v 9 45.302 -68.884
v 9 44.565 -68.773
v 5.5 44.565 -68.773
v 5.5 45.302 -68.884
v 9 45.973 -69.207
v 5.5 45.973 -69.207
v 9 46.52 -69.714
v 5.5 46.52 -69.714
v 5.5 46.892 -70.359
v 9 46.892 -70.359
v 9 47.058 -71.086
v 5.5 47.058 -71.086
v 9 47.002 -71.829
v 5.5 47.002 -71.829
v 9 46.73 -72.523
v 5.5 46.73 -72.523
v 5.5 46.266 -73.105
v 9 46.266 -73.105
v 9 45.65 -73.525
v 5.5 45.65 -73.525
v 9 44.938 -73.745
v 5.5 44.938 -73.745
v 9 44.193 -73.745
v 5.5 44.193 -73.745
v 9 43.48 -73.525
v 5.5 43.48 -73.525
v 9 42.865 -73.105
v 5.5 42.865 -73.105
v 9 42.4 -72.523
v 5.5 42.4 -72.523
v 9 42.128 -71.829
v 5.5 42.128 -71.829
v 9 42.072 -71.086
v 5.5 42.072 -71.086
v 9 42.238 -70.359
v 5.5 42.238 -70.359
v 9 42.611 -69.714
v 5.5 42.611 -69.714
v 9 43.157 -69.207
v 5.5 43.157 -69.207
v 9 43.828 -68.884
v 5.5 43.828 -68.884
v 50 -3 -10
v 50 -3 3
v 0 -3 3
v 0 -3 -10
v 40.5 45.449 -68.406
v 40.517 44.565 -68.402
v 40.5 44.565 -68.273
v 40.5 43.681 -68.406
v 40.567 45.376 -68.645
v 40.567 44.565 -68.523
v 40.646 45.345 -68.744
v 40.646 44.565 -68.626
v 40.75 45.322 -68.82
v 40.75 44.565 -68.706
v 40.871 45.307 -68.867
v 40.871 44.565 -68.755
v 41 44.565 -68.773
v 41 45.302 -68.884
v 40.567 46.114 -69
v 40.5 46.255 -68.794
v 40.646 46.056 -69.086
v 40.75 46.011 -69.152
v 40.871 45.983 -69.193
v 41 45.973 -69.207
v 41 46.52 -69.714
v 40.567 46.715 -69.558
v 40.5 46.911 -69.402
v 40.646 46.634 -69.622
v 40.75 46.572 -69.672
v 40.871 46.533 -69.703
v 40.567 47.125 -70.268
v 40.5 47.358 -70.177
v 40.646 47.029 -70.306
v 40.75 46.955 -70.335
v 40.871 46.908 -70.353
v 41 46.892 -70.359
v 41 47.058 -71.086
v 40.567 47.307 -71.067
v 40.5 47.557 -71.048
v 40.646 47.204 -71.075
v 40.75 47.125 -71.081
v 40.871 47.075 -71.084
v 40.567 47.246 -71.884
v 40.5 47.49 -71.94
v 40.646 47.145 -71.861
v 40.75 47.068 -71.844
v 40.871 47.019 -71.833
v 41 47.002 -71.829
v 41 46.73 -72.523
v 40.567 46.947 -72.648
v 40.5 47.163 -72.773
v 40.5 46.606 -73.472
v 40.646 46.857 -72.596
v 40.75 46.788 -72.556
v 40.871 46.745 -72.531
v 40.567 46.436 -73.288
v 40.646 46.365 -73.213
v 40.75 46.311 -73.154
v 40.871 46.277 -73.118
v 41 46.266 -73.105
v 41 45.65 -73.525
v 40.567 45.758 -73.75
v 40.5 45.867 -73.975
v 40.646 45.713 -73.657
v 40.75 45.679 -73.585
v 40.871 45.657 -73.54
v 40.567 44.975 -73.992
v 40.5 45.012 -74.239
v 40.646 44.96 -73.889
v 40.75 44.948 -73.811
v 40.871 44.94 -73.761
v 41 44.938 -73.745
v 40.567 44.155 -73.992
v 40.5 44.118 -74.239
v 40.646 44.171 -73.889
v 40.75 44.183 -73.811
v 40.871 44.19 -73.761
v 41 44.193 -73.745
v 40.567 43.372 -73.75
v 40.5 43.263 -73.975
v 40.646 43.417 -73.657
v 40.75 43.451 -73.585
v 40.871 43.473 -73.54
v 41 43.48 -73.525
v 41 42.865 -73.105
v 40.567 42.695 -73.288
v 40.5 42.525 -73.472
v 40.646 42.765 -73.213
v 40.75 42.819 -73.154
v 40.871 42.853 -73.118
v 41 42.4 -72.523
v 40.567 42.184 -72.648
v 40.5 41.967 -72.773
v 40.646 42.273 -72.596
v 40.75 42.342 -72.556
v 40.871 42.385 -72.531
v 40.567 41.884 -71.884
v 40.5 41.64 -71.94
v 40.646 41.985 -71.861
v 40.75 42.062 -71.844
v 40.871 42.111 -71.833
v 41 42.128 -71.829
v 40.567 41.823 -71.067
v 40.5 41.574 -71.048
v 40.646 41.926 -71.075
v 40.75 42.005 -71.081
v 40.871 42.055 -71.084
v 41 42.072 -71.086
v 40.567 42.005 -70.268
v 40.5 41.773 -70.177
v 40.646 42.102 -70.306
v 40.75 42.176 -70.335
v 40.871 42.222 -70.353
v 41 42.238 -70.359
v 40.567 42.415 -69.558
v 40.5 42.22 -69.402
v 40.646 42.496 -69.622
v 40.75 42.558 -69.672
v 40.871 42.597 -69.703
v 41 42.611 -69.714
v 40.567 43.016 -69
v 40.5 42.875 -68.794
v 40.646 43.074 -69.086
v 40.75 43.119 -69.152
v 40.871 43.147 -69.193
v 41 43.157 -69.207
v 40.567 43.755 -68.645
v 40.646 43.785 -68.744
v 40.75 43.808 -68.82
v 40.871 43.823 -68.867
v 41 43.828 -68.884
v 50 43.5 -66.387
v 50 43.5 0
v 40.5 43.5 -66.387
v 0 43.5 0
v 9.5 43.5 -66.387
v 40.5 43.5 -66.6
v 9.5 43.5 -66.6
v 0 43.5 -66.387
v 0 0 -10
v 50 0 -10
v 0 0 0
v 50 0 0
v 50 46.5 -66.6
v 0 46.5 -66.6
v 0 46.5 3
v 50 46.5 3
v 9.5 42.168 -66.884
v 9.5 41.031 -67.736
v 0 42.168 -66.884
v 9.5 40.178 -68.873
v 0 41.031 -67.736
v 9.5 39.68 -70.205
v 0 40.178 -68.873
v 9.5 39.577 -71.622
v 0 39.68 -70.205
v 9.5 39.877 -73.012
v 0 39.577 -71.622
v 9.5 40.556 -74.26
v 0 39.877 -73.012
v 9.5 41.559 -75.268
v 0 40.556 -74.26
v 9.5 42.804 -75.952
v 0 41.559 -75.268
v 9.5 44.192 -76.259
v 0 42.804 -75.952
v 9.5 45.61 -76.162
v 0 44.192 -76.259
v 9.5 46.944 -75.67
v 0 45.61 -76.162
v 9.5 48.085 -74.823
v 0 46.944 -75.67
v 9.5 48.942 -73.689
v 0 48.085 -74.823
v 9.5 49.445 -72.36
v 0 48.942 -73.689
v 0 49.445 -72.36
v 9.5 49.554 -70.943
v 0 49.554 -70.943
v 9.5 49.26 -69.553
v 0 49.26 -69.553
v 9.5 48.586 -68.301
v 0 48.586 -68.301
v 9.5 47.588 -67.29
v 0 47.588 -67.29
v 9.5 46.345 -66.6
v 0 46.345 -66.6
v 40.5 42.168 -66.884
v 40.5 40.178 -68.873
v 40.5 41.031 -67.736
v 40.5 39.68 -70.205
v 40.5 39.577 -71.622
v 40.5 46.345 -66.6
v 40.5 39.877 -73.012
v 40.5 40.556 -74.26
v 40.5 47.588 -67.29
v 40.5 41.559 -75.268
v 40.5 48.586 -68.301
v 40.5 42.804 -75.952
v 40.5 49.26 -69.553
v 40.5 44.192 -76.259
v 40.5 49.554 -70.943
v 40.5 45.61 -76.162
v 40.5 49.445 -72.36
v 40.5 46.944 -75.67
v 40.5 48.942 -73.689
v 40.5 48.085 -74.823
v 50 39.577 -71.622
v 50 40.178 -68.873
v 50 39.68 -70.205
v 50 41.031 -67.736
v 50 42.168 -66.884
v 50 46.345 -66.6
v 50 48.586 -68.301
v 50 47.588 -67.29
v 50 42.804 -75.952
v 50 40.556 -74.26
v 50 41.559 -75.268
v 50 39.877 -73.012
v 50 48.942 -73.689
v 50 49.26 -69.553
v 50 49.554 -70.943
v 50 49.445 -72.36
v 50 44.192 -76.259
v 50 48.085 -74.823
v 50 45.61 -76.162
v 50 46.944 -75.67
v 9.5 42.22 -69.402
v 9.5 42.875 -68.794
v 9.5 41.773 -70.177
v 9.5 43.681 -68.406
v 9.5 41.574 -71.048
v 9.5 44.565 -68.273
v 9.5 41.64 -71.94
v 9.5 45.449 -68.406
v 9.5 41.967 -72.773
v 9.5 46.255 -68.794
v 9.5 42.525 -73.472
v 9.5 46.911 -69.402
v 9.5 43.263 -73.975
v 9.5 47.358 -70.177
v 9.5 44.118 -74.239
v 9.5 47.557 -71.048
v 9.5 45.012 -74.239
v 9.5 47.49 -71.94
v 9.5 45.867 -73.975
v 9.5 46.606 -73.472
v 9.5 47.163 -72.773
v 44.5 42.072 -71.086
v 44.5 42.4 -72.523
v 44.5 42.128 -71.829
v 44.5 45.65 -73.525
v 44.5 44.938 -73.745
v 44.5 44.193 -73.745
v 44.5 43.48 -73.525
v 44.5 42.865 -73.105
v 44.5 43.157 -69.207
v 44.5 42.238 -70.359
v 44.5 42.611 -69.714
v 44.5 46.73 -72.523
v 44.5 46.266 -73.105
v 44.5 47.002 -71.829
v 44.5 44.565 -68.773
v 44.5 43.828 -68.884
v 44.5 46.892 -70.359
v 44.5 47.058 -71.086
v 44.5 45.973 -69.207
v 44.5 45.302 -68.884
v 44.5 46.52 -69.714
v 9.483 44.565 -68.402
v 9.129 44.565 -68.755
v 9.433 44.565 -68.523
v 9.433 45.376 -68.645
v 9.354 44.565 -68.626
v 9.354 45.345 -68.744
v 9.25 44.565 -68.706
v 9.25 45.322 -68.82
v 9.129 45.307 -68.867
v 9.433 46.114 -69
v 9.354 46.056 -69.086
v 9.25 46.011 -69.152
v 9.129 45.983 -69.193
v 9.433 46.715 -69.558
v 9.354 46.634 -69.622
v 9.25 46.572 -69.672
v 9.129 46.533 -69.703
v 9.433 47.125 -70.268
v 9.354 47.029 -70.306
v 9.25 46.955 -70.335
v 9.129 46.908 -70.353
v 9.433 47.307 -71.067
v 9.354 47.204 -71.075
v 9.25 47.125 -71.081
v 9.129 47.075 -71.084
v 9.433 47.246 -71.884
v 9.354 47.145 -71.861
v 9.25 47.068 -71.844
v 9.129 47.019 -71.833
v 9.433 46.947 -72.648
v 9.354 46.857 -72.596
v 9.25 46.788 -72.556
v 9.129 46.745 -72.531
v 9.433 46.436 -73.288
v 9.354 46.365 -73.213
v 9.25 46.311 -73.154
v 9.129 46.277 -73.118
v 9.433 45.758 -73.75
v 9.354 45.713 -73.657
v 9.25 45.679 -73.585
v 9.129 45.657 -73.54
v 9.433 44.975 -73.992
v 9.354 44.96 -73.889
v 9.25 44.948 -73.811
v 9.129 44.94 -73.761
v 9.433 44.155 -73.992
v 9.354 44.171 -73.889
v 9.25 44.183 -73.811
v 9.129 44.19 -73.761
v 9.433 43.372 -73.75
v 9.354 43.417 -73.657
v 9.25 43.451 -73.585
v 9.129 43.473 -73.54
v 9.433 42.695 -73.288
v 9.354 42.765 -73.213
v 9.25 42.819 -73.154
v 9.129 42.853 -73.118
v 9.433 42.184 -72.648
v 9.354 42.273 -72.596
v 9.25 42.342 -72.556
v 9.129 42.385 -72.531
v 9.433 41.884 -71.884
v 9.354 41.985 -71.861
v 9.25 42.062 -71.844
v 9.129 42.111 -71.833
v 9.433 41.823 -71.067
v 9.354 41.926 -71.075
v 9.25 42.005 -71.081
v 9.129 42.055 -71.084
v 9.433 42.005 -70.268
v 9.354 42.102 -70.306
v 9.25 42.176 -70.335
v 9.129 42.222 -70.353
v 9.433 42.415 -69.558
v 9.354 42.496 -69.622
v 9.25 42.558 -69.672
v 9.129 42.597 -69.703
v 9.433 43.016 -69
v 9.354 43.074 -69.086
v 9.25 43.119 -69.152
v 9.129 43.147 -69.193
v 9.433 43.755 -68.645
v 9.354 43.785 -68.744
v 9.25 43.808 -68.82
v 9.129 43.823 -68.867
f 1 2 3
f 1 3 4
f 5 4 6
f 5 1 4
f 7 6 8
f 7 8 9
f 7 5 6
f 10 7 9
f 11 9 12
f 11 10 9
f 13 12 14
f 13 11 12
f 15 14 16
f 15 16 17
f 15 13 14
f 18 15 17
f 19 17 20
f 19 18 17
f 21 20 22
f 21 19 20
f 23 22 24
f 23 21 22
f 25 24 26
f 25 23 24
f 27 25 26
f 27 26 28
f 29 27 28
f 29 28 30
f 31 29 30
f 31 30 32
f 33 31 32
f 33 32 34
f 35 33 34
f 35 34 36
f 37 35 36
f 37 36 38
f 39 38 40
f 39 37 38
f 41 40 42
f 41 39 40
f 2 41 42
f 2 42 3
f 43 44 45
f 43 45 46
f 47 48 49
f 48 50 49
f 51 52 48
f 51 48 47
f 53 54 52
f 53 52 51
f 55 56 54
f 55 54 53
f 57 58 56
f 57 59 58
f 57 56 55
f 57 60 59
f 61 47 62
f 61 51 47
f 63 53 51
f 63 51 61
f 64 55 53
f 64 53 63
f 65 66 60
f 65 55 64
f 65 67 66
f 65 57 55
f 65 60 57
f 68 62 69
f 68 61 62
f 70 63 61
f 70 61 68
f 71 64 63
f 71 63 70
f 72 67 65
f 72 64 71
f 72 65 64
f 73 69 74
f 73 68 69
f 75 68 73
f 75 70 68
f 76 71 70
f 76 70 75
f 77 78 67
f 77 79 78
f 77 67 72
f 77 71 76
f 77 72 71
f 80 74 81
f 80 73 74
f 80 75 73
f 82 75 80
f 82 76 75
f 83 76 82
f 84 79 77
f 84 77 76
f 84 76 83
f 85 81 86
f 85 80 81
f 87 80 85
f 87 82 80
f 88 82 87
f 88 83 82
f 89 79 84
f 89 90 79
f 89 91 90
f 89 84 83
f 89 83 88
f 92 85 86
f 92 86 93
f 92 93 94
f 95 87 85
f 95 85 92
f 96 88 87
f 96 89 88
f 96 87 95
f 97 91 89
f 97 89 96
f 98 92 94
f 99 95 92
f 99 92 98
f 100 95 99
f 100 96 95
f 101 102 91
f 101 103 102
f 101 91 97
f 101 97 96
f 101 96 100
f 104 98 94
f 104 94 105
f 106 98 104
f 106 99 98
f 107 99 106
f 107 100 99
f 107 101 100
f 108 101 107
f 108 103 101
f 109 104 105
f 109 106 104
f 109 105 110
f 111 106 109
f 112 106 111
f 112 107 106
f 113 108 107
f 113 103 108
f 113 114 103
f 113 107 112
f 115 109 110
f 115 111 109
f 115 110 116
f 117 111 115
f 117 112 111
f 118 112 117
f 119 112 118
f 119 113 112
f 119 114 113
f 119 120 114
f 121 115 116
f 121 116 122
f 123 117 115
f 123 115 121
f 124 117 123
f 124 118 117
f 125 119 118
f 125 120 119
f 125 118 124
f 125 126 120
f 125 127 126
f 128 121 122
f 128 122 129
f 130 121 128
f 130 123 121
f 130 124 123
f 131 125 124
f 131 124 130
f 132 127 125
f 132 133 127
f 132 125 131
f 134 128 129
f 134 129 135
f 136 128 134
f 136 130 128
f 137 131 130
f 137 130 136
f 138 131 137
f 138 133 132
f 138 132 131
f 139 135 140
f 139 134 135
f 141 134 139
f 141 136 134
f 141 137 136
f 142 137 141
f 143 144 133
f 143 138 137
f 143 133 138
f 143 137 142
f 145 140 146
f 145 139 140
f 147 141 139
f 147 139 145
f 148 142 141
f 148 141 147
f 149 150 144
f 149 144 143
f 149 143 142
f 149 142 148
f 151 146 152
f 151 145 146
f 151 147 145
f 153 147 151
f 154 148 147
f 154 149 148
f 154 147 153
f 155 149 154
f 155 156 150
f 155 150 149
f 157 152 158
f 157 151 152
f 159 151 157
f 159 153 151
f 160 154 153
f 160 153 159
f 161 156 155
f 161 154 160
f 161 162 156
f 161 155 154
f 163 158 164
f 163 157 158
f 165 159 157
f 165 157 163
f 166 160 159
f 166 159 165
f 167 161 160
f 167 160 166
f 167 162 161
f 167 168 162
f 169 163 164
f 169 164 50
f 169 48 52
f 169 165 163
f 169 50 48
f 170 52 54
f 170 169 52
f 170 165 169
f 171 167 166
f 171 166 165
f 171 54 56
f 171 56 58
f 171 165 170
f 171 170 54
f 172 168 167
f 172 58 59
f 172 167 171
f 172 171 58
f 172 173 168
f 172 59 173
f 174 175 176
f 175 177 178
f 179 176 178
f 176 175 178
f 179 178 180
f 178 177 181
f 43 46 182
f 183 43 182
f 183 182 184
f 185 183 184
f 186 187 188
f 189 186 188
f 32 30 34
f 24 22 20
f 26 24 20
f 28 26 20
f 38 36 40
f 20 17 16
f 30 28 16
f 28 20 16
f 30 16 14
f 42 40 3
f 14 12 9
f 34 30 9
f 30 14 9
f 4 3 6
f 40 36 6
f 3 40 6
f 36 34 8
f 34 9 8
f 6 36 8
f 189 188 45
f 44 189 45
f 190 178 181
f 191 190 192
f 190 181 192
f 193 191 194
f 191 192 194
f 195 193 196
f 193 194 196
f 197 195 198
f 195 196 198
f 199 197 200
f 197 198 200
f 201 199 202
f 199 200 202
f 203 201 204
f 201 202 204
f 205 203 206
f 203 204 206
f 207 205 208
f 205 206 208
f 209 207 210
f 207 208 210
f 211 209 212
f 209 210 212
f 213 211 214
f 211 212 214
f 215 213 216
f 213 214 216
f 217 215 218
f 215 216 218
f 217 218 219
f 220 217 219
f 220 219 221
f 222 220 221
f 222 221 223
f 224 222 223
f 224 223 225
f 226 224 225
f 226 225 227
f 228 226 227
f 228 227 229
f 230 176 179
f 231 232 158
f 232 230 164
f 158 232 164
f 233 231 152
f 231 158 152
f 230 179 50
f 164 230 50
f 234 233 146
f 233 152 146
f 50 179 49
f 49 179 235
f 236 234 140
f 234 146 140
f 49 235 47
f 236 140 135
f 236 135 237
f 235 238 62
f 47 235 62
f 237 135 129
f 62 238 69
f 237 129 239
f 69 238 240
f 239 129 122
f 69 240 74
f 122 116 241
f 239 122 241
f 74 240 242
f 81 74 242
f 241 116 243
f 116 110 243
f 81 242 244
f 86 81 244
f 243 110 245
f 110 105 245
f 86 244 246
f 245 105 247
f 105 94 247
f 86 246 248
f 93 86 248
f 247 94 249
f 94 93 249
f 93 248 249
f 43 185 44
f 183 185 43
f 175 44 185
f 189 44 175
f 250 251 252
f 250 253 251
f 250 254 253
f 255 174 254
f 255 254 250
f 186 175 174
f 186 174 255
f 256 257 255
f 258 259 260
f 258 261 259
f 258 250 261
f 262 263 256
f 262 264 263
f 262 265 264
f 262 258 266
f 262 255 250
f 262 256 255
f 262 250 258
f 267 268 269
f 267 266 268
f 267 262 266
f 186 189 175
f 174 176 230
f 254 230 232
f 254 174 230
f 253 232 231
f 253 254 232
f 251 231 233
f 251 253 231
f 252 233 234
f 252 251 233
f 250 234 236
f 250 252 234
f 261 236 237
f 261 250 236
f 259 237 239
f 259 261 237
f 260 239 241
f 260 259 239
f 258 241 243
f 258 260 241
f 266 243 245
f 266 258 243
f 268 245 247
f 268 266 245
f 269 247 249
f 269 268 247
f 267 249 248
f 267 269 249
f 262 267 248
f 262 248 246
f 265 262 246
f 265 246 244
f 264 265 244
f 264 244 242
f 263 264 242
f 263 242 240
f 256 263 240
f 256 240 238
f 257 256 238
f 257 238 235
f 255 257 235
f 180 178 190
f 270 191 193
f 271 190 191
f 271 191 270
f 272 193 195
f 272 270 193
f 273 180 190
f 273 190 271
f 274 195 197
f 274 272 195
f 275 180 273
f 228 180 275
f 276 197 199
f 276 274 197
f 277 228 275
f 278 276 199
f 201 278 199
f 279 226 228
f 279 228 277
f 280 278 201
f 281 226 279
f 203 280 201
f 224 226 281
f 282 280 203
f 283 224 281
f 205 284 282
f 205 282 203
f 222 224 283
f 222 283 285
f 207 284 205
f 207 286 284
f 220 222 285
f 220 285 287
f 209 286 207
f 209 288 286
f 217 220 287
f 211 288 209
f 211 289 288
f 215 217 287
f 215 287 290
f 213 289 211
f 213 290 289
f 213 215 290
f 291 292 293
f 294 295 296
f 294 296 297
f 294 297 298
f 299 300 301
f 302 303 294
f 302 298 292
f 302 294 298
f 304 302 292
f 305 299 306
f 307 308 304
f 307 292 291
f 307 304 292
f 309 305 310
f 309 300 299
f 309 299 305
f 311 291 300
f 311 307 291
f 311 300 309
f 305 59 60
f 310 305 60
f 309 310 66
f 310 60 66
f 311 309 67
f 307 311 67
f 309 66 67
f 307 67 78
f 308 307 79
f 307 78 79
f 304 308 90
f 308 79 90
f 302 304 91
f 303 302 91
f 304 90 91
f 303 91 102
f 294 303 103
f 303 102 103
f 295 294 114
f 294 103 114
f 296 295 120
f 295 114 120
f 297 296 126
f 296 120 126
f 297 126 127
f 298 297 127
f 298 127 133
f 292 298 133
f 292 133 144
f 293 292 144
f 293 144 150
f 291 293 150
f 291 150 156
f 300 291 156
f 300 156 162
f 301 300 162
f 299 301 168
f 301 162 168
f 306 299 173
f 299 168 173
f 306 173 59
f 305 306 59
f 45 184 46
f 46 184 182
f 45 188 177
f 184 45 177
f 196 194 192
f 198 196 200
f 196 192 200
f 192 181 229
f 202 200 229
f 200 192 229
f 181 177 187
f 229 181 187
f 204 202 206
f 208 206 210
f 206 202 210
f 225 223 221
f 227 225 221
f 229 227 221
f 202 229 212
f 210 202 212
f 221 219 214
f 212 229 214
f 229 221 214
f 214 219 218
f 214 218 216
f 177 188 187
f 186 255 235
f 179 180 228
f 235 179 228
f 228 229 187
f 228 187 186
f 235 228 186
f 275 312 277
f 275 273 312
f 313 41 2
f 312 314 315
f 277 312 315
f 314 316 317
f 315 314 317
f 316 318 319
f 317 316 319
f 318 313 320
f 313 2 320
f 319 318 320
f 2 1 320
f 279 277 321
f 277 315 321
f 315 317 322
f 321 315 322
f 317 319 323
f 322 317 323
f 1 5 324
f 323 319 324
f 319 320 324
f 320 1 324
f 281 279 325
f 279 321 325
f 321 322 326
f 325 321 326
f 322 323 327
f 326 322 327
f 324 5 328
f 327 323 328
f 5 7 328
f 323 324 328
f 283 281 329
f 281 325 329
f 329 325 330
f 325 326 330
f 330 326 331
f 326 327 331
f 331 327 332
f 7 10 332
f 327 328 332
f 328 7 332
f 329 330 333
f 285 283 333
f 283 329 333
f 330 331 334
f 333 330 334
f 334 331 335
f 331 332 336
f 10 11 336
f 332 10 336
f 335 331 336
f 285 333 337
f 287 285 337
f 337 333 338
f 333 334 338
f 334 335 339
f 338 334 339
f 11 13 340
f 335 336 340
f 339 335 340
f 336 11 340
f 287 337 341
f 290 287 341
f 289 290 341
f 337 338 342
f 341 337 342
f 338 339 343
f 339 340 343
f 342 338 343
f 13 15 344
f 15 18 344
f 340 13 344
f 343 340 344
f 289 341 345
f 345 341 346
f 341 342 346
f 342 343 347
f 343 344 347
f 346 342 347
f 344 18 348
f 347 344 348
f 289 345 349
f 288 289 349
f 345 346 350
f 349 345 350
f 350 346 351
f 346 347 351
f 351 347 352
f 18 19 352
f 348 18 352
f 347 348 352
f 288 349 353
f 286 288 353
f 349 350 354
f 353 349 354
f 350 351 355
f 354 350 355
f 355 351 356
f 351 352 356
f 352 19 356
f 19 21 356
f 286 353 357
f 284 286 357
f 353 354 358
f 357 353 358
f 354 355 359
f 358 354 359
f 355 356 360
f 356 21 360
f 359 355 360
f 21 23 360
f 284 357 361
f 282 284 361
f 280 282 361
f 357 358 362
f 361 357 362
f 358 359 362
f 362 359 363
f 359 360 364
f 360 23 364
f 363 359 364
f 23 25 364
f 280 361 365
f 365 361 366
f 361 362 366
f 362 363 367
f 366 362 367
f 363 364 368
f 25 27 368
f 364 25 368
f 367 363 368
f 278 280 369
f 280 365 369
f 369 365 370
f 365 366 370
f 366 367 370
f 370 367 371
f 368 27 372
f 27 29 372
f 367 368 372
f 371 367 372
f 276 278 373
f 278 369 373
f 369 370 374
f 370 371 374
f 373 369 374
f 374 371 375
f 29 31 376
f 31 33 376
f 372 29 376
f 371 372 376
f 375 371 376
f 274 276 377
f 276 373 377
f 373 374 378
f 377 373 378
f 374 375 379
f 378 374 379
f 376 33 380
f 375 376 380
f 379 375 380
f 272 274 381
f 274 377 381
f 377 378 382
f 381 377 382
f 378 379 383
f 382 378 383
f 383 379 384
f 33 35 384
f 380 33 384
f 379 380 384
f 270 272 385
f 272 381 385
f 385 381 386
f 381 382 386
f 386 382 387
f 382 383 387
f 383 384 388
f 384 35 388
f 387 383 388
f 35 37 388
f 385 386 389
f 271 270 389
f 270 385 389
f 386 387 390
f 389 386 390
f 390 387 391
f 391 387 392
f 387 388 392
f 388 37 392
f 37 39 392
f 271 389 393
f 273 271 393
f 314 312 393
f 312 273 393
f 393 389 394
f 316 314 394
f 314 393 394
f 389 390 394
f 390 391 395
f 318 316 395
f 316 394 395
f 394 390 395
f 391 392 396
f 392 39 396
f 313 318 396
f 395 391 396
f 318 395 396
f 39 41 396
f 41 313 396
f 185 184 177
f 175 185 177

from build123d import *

# Parameters (mm, degrees)
BOSS_EXTRUDE1_DEPTH  = 50
SKETCH2_R            = 5
BOSS_EXTRUDE2_DEPTH  = 9.5
SKETCH3_R            = 2.5
CUT_EXTRUDE1_DEPTH   = 4
FILLET1_R            = 0.5
FILLET1_OF_MIRROR2_R = 0.5


with BuildPart() as part:
    # Sketch1 → Boss-Extrude1 (new body)
    with BuildSketch(Plane(origin=(0, 0, 0), x_dir=(0, 0, -1), z_dir=(1, 0, 0))):
        Polygon((0, 0), (0, 43.5), (66.6, 43.5), (66.6, 46.5), (-3, 46.5), (-3, -3), (10, -3), (10, 0), align=None)
    extrude(amount=BOSS_EXTRUDE1_DEPTH)

    # Sketch2 → Boss-Extrude2 (add)
    with BuildSketch(Plane(origin=(50, 0, 0), x_dir=(0, 0, -1), z_dir=(1, 0, 0))):
        with Locations((71.272526987, 44.565123004)):
            Circle(SKETCH2_R)
    boss_extrude2 = extrude(amount=-BOSS_EXTRUDE2_DEPTH)

    # Sketch3 → Cut-Extrude1 (cut)
    with BuildSketch(Plane.ZY.offset(-40.5)):
        with Locations((-71.272526987, 44.565123004)):
            Circle(SKETCH3_R)
    cut_extrude1 = extrude(amount=-CUT_EXTRUDE1_DEPTH, mode=Mode.SUBTRACT)

    # Fillet1
    fillet1_edges = [part.edges().sort_by_distance(p)[0] for p in [
        (40.5, 44.565123004, -73.772526987),
    ]]
    fillet(fillet1_edges, radius=FILLET1_R)

    # Mirror2: Boss-Extrude2, Cut-Extrude1 across plane
    add(boss_extrude2.mirror(Plane(origin=(25, 0, 0), x_dir=(0, 0, 1), z_dir=(1, 0, 0))))
    add(cut_extrude1.mirror(Plane(origin=(25, 0, 0), x_dir=(0, 0, 1), z_dir=(1, 0, 0))), mode=Mode.SUBTRACT)

    # Fillet1 of Mirror2
    fillet1_of_mirror2_edges = [part.edges().sort_by_distance(p)[0] for p in [
        (9.5, 44.565123004, -73.772526987),
    ]]
    fillet(fillet1_of_mirror2_edges, radius=FILLET1_OF_MIRROR2_R)


solid = part.part
